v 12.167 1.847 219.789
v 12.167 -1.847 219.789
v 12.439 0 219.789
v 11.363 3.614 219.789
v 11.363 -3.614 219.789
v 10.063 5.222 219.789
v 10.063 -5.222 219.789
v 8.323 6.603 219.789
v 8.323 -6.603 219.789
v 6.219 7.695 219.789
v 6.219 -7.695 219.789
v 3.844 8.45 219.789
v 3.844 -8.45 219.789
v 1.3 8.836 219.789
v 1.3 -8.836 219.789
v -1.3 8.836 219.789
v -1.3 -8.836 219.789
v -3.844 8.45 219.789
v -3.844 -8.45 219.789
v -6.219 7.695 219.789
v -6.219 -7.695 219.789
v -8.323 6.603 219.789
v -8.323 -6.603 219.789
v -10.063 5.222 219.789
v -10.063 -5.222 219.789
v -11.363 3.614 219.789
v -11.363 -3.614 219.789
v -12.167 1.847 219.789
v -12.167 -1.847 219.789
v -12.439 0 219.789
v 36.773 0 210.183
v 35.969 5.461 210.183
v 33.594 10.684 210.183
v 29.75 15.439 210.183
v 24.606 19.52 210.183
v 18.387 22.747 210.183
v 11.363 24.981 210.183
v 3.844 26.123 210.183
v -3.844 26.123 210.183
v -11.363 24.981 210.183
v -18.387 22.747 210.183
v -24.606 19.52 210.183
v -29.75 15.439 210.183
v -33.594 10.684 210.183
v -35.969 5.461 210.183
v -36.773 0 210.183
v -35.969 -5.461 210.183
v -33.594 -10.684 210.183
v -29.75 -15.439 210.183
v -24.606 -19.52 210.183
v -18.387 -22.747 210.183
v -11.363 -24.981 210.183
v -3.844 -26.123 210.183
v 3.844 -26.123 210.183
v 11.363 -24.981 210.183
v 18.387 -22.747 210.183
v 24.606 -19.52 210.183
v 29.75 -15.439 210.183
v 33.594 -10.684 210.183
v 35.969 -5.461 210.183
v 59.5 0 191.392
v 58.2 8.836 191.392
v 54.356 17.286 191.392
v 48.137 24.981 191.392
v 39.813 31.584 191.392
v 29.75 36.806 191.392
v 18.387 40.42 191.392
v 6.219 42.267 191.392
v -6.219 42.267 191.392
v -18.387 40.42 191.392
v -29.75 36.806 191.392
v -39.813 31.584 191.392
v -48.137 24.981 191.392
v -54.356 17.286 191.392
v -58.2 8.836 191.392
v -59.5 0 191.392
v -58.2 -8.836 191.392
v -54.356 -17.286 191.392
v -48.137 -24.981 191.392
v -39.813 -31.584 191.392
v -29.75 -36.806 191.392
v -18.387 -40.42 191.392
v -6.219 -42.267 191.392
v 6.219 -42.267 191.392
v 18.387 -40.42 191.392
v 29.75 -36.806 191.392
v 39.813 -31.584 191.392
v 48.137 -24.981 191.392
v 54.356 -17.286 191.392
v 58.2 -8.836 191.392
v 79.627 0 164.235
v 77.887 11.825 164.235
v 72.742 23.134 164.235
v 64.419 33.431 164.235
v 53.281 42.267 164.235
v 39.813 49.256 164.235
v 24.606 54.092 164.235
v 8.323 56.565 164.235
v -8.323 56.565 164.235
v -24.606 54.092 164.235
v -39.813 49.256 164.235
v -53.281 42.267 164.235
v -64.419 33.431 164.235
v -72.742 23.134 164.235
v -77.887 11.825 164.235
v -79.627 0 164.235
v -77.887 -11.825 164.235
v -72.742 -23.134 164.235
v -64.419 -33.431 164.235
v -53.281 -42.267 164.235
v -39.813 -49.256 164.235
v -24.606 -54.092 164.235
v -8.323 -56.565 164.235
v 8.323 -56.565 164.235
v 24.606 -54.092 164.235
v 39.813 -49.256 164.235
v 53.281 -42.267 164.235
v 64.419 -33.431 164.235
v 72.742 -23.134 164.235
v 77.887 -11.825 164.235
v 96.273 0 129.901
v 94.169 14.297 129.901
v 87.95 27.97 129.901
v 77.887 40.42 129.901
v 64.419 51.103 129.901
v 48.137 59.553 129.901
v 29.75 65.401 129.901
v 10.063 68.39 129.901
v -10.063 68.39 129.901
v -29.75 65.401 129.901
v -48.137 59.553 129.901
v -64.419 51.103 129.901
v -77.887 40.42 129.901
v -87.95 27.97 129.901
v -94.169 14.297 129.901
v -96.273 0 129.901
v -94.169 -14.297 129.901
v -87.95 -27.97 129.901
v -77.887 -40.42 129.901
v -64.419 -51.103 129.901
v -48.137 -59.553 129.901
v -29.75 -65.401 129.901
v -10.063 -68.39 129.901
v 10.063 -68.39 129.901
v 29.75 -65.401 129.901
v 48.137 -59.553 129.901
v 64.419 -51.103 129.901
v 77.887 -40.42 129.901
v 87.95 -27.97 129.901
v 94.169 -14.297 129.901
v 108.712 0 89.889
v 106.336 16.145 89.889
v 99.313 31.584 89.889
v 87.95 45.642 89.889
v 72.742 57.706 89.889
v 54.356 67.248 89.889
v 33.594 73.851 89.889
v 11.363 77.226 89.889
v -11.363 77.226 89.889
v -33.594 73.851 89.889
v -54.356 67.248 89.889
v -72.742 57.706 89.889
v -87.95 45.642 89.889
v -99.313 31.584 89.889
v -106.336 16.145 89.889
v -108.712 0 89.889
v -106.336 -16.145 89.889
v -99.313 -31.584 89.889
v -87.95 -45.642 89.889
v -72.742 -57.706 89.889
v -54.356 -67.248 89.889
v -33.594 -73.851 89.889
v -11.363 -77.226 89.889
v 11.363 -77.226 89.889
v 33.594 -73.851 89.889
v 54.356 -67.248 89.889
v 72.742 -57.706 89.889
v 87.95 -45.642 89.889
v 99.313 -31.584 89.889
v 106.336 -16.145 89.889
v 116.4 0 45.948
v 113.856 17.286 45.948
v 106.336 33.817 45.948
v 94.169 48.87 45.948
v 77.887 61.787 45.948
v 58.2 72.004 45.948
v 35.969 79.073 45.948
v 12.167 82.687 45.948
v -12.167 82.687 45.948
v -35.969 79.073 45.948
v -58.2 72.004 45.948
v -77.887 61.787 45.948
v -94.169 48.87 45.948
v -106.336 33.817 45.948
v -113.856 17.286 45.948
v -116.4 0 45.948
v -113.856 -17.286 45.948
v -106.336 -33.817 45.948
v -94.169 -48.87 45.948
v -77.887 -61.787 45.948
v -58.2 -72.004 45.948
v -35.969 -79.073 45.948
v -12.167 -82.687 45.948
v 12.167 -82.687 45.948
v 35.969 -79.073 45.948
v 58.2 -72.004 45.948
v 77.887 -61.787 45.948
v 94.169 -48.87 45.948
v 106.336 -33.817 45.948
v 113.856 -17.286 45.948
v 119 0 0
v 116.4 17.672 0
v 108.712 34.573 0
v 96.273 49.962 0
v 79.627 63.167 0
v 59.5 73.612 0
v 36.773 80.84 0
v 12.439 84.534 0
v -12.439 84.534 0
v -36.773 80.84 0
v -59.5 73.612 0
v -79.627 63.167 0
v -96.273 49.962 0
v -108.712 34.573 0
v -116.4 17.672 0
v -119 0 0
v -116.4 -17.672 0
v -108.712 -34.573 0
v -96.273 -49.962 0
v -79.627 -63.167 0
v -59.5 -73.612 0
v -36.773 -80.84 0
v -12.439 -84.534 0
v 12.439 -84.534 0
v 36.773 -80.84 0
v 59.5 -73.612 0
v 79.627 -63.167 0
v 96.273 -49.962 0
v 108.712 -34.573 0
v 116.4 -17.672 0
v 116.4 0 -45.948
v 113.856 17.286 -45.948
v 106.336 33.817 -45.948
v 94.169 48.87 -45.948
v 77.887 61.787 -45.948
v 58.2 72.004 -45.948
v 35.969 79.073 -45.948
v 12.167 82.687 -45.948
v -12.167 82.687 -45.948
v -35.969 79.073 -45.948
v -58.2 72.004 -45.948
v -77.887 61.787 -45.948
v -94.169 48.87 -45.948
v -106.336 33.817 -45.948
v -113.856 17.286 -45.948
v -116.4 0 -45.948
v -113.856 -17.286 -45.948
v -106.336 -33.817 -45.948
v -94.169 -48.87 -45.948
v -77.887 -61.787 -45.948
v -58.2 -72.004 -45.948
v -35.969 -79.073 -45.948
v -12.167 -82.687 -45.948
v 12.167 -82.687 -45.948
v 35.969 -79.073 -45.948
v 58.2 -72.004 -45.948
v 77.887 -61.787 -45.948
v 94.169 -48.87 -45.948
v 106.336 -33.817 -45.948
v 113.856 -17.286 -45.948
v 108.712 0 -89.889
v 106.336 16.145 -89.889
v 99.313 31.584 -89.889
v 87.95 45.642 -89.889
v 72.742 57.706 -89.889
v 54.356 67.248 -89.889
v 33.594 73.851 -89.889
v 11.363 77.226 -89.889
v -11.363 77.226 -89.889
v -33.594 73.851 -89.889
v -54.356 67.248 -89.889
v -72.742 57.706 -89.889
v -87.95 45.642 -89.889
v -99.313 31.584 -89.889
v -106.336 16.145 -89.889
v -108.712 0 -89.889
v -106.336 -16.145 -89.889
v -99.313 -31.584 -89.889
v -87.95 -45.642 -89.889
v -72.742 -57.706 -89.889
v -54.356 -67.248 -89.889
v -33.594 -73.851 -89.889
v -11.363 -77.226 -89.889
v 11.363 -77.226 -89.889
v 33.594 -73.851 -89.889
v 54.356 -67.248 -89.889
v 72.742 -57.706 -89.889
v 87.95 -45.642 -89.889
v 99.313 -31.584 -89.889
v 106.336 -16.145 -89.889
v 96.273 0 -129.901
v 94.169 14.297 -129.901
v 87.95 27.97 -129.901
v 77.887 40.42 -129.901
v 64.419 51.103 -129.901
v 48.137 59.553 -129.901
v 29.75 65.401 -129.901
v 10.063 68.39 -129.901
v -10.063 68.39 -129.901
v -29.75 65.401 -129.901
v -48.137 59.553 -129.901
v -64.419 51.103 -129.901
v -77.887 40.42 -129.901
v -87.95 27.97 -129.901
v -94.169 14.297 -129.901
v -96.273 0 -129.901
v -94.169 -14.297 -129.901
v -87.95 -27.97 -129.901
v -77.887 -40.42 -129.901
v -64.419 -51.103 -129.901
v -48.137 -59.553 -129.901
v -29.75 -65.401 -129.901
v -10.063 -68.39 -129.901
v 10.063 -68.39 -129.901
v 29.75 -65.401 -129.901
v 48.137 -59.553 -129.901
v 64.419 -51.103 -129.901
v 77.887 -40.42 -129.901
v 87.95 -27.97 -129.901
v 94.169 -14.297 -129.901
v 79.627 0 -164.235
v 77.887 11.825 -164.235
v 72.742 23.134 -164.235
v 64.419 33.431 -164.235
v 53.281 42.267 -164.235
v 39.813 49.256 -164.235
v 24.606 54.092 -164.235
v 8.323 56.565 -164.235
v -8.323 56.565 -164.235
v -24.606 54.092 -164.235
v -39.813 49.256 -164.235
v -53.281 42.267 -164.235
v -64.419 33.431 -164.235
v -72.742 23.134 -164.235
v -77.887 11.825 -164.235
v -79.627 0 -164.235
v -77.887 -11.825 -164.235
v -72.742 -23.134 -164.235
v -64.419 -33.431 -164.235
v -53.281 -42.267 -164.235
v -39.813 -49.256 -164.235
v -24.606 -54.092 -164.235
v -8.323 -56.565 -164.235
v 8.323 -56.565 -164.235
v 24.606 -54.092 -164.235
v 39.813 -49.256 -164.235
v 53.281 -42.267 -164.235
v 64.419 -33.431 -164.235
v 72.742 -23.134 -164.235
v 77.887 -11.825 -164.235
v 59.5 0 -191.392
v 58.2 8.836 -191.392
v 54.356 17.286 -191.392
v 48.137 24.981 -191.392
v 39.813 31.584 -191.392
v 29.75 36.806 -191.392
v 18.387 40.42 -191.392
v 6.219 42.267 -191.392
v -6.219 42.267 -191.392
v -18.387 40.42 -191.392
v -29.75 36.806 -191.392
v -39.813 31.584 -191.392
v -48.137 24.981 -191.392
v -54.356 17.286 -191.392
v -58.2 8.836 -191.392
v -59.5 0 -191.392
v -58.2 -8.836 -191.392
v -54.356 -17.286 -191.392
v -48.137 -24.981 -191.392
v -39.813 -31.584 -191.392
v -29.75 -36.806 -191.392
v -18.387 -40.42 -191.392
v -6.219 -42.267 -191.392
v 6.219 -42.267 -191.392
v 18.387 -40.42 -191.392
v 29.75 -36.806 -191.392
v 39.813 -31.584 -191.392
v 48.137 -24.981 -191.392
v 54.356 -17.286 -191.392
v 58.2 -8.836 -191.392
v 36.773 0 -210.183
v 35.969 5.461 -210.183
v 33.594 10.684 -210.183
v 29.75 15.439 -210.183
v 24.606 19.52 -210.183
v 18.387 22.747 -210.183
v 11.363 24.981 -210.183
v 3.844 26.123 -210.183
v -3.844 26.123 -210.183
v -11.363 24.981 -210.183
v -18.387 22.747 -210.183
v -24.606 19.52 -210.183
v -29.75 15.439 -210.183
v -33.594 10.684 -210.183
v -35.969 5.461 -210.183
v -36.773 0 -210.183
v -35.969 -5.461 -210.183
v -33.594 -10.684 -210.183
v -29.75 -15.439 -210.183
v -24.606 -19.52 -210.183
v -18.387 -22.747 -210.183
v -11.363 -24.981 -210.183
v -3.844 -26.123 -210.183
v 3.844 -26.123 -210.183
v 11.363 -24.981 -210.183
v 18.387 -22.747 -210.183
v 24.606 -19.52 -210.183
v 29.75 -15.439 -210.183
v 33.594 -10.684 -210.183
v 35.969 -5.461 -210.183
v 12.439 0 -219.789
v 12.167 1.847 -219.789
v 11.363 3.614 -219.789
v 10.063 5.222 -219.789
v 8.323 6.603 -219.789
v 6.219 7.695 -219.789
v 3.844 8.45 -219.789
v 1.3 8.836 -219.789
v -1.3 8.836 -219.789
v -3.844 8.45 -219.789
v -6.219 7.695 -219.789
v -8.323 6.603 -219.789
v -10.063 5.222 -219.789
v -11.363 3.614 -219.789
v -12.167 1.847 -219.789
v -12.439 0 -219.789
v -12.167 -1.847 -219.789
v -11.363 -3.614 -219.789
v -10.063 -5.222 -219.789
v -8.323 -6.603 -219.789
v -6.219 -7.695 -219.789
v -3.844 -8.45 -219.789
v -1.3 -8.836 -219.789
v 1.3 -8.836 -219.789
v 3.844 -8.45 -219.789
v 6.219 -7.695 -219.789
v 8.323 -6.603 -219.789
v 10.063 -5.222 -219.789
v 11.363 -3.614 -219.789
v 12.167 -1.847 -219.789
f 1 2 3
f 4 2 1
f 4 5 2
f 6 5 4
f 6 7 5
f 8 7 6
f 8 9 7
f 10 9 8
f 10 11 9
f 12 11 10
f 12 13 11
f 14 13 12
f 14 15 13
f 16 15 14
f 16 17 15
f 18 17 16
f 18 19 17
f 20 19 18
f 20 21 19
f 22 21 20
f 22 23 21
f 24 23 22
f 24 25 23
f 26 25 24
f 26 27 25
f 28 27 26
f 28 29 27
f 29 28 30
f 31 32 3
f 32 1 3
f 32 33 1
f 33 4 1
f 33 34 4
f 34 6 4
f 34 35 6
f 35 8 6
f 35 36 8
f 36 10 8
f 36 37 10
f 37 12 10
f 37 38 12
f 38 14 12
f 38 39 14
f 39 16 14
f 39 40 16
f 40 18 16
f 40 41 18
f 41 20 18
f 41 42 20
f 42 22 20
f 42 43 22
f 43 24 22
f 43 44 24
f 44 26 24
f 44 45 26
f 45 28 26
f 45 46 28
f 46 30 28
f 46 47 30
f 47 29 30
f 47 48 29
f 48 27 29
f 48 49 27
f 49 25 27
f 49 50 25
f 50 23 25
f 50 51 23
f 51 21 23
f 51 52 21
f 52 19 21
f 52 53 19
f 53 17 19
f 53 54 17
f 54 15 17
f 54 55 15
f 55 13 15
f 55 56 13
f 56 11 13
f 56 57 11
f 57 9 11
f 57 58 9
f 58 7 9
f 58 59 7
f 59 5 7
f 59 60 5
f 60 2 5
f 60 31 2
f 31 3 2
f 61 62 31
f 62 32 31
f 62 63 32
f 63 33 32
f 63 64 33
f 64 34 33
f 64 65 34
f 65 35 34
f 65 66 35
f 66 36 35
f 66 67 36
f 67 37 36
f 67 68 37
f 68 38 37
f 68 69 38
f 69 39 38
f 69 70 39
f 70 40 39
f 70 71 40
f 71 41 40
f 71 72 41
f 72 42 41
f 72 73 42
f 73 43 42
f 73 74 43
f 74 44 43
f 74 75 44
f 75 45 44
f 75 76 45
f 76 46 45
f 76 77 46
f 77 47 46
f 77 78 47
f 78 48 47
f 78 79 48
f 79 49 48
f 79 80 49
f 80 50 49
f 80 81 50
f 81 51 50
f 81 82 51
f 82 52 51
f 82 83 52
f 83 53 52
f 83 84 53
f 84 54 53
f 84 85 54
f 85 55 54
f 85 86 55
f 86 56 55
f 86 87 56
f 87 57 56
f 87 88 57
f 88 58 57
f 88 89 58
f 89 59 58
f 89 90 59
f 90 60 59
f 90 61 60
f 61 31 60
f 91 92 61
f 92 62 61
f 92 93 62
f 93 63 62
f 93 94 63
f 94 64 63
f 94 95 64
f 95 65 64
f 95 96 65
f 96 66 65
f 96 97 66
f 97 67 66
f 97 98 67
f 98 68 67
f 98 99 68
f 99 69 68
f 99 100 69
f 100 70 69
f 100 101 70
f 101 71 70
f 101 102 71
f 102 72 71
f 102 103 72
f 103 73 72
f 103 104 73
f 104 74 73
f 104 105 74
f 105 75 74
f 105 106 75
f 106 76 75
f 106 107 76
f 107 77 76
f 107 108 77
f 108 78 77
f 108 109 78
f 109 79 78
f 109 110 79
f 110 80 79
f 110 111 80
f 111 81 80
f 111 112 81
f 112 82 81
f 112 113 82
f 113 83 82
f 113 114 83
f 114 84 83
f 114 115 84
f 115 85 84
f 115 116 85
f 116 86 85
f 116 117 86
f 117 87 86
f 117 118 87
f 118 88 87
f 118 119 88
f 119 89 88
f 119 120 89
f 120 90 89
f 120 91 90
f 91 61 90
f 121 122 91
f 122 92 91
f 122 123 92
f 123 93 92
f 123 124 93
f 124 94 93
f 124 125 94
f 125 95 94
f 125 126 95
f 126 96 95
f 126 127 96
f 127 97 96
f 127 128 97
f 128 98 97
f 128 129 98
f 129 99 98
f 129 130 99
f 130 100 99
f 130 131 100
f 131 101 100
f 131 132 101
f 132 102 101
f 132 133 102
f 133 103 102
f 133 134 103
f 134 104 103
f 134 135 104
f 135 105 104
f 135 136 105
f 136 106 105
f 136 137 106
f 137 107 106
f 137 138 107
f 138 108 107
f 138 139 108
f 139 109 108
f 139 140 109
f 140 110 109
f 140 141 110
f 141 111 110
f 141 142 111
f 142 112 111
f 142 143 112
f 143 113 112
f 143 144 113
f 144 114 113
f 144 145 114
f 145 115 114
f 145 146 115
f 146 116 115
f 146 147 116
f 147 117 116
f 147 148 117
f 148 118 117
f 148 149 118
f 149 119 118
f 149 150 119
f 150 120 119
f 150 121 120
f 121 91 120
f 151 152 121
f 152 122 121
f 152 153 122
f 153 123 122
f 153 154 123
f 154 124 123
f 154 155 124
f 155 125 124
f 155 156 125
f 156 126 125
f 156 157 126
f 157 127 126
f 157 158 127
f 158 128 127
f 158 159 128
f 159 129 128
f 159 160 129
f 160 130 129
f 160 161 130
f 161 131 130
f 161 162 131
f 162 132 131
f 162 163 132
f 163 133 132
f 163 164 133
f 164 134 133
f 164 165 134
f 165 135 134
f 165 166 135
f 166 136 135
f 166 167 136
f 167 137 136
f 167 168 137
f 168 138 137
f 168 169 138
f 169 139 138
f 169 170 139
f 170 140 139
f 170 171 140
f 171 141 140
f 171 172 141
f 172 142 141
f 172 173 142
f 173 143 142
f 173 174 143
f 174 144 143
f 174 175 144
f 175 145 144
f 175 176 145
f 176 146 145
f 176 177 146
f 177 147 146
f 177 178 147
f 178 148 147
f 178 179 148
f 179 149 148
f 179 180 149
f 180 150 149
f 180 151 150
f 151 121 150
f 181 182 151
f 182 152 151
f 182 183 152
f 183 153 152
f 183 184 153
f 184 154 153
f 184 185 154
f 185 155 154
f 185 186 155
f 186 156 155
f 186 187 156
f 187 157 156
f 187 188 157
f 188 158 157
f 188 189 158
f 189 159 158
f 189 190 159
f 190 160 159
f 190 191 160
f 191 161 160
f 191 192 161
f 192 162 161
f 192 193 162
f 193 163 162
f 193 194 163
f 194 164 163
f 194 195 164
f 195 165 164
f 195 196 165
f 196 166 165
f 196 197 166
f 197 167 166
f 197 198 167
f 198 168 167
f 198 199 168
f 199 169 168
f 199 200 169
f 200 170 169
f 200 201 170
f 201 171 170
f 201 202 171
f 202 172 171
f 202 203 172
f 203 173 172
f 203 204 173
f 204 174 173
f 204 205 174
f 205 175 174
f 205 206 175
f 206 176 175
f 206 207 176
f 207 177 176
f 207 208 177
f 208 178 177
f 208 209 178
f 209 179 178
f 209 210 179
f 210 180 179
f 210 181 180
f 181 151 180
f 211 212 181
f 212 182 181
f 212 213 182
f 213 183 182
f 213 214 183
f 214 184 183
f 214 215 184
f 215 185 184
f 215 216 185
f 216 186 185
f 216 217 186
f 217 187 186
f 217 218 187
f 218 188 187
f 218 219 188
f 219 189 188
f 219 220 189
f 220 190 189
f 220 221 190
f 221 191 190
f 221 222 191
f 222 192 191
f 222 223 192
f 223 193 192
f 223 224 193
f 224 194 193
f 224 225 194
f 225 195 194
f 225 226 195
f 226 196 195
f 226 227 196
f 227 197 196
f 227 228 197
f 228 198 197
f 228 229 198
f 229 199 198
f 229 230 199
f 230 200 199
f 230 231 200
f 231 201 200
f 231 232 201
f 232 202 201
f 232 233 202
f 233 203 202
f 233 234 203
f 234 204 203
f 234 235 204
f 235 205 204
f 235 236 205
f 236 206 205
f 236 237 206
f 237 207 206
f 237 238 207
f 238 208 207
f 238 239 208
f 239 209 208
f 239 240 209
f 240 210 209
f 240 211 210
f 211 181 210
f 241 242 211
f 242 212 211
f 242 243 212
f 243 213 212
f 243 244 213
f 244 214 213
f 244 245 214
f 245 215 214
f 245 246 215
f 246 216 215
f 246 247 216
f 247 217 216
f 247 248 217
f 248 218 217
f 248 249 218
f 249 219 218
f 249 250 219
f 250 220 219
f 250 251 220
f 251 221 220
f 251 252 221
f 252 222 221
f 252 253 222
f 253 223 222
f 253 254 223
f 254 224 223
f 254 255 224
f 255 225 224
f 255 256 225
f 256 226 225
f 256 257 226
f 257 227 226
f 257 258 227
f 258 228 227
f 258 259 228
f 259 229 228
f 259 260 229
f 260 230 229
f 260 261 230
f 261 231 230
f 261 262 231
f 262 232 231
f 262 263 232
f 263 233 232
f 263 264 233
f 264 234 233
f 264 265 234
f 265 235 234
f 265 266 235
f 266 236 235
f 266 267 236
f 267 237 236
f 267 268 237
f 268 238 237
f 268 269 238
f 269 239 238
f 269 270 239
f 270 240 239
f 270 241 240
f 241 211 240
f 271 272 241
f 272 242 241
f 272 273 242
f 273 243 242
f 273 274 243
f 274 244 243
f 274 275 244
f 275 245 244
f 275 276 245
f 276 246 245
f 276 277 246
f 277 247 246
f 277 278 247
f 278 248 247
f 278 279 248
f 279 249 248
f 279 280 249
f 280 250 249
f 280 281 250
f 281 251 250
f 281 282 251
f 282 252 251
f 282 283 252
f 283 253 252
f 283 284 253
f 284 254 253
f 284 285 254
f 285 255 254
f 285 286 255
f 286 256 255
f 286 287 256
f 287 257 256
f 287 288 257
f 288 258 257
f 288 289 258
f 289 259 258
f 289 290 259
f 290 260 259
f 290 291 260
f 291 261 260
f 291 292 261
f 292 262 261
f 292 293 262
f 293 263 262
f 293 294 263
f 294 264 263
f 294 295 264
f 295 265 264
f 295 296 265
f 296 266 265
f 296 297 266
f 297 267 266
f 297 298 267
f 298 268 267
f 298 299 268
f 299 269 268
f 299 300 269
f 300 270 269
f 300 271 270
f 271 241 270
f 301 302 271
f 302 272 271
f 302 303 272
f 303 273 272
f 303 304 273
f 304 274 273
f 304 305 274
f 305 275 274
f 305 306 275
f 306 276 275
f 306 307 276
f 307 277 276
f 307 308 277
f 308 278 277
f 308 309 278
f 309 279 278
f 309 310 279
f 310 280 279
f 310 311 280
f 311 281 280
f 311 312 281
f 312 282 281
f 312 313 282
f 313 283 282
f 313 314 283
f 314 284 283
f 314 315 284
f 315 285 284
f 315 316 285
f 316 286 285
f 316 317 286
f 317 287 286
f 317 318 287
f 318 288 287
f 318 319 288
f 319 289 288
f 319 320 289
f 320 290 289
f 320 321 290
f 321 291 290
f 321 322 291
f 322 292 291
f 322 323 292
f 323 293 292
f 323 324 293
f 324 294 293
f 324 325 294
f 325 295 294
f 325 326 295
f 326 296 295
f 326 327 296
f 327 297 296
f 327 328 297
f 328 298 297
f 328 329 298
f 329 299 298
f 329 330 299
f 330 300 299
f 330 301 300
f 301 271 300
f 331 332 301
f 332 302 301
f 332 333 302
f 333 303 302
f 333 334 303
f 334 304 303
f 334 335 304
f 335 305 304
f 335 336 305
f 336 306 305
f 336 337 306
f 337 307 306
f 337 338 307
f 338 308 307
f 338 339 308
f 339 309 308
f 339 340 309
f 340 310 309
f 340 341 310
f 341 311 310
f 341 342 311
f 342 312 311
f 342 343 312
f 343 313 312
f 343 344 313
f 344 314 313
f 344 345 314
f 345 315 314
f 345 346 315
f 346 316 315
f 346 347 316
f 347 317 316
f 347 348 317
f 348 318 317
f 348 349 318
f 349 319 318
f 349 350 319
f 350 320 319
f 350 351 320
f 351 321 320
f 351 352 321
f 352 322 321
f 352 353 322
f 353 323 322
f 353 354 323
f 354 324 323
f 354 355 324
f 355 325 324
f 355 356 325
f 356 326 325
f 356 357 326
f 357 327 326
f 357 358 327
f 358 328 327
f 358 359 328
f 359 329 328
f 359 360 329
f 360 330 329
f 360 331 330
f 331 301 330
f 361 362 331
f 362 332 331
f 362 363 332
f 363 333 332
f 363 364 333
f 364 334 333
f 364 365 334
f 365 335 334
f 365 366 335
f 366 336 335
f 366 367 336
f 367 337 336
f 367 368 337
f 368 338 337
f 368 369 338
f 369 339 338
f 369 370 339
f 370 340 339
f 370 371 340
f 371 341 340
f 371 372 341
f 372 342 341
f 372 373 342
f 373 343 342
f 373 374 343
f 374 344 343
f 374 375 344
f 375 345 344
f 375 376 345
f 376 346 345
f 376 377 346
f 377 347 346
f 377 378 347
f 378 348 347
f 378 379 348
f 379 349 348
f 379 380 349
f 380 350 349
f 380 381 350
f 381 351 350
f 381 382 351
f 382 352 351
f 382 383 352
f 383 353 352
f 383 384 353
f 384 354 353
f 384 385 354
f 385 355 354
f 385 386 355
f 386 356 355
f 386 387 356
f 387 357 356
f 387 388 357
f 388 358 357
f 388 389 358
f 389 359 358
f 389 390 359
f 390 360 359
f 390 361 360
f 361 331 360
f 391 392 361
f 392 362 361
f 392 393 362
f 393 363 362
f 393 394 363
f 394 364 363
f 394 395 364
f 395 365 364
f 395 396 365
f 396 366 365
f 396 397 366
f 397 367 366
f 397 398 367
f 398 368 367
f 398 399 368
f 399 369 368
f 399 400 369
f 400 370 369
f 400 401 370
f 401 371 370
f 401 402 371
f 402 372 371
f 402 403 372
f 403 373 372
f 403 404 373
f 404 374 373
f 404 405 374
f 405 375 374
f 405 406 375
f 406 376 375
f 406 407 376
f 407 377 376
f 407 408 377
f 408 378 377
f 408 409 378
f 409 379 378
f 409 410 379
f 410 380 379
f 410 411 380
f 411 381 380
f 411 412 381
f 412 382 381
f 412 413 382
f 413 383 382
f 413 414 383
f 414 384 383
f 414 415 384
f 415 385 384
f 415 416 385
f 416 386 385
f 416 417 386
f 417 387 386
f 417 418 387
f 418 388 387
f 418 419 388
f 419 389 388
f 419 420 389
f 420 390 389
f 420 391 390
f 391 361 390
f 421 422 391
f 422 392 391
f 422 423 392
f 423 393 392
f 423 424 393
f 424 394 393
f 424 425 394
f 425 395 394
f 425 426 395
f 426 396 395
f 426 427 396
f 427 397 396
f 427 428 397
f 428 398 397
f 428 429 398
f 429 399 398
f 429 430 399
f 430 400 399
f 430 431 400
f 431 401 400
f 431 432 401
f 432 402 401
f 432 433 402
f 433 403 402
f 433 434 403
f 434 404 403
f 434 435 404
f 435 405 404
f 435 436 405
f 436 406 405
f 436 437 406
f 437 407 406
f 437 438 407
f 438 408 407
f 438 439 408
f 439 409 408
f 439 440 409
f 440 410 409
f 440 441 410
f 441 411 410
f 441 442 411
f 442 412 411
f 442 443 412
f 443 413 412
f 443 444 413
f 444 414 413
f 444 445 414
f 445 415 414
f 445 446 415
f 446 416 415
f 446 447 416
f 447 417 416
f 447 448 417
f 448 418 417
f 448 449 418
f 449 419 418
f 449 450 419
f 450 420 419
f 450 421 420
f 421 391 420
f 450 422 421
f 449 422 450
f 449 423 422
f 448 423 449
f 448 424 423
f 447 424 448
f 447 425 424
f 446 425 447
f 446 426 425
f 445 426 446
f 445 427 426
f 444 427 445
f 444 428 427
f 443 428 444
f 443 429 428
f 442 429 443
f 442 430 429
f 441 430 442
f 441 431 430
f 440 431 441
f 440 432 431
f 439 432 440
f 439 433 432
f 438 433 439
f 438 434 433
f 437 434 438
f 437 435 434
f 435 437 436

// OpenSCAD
// Generated by SolidPython 1.0.1 on 2020-07-29 00:46:47


scale(v = [7, 5, 13]) {
	sphere(r = 17);
}
/***********************************************
*********      SolidPython code:      **********
************************************************
 
# import packages: SolidPython
from solid import *
from solid.utils import *
from itertools import chain, combinations, permutations


class Resize:

    def __init__(self, scad_file):
        self.scad_file = scad_file
        #self.scad_file = import_scad(scad_file)
        # cone/cylinder param:
        self.r1 = 0
        self.r2 = 0
        self.h = 0
        # rectangular prism param:
        self.w = 0
        self.l = 0
        # ellipse param:
        self.r = 0

    # import OpenScad code (file name corresponds to shape)


    # classify shape + parameters
    def assign(self, param1, param2, param3):
        if self.scad_file == 'cone.scad':
            self.r1 = param1
            self.r2 = param2
            self.h = param3
        elif self.scad_file == 'cylinder.scad':
            self.r1 = param1
            self.r2 = param2
            self.h = param3
        elif self.scad_file == 'rectangularPrism.scad':
            self.h = param1
            self.l = param2
            self.w = param3
        else:
            self.r = param1
            self.h = param2

    # resize parameters
    def iterate(self):
        x = range(3, 20, 2)
        i = 1
        if self.scad_file == 'cone.scad':
            tempList = list(permutations(x, 2))
            for temp in tempList:
                param1 = temp[0]
                param2 = temp[1]
                filepath = 'produced_scad_files/' + 'cone' + str(param1) + '_' + str(param2) + '_' + '.scad'
                scad_render_to_file(cylinder(h=param1, r1=param2, r2=0), filepath)

        elif self.scad_file == 'cylinder.scad':
            tempList = list(permutations(x, 3))
            for temp in tempList:
                param1 = temp[0]
                param2 = temp[1]
                filepath = 'produced_scad_files/' + 'cylinder' + str(param1) + '_' + str(param2) + '_' + '.scad'
                scad_render_to_file(cylinder(h=param1, r1=param2, r2=param2), filepath)

        elif self.scad_file == 'rectangularPrism.scad':
            tempList = list(permutations(x, 3))
            for temp in tempList:
                param1 = temp[0]
                param2 = temp[1]
                param3 = temp[2]
                filepath = 'produced_scad_files/' + 'rectangularPrism' + str(param1) + '_' + str(param2) + '_' + str(
                    param3) + '.scad'
                scad_render_to_file(cube(size=(param1, param2, param3)), filepath)

        elif self.scad_file == 'ellipse.scad':
            tempList = list(permutations(x, 4))
            for temp in tempList:
                param1 = temp[0]
                param2 = temp[1]
                param3 = temp[2]
                param4 = temp[3]
                filepath = 'produced_scad_files/' + 'ellipse' + str(param1) + '_' + str(param2) + '_' + str(param3) + '_' + str(param4) + '.scad'
                scad_render_to_file(scale([param1, param2, param3])(sphere(r=param4)), filepath)

    def render_to_scadfile(self):
        scad_render_to_file(scad, 'example.scad') 
 
************************************************/
